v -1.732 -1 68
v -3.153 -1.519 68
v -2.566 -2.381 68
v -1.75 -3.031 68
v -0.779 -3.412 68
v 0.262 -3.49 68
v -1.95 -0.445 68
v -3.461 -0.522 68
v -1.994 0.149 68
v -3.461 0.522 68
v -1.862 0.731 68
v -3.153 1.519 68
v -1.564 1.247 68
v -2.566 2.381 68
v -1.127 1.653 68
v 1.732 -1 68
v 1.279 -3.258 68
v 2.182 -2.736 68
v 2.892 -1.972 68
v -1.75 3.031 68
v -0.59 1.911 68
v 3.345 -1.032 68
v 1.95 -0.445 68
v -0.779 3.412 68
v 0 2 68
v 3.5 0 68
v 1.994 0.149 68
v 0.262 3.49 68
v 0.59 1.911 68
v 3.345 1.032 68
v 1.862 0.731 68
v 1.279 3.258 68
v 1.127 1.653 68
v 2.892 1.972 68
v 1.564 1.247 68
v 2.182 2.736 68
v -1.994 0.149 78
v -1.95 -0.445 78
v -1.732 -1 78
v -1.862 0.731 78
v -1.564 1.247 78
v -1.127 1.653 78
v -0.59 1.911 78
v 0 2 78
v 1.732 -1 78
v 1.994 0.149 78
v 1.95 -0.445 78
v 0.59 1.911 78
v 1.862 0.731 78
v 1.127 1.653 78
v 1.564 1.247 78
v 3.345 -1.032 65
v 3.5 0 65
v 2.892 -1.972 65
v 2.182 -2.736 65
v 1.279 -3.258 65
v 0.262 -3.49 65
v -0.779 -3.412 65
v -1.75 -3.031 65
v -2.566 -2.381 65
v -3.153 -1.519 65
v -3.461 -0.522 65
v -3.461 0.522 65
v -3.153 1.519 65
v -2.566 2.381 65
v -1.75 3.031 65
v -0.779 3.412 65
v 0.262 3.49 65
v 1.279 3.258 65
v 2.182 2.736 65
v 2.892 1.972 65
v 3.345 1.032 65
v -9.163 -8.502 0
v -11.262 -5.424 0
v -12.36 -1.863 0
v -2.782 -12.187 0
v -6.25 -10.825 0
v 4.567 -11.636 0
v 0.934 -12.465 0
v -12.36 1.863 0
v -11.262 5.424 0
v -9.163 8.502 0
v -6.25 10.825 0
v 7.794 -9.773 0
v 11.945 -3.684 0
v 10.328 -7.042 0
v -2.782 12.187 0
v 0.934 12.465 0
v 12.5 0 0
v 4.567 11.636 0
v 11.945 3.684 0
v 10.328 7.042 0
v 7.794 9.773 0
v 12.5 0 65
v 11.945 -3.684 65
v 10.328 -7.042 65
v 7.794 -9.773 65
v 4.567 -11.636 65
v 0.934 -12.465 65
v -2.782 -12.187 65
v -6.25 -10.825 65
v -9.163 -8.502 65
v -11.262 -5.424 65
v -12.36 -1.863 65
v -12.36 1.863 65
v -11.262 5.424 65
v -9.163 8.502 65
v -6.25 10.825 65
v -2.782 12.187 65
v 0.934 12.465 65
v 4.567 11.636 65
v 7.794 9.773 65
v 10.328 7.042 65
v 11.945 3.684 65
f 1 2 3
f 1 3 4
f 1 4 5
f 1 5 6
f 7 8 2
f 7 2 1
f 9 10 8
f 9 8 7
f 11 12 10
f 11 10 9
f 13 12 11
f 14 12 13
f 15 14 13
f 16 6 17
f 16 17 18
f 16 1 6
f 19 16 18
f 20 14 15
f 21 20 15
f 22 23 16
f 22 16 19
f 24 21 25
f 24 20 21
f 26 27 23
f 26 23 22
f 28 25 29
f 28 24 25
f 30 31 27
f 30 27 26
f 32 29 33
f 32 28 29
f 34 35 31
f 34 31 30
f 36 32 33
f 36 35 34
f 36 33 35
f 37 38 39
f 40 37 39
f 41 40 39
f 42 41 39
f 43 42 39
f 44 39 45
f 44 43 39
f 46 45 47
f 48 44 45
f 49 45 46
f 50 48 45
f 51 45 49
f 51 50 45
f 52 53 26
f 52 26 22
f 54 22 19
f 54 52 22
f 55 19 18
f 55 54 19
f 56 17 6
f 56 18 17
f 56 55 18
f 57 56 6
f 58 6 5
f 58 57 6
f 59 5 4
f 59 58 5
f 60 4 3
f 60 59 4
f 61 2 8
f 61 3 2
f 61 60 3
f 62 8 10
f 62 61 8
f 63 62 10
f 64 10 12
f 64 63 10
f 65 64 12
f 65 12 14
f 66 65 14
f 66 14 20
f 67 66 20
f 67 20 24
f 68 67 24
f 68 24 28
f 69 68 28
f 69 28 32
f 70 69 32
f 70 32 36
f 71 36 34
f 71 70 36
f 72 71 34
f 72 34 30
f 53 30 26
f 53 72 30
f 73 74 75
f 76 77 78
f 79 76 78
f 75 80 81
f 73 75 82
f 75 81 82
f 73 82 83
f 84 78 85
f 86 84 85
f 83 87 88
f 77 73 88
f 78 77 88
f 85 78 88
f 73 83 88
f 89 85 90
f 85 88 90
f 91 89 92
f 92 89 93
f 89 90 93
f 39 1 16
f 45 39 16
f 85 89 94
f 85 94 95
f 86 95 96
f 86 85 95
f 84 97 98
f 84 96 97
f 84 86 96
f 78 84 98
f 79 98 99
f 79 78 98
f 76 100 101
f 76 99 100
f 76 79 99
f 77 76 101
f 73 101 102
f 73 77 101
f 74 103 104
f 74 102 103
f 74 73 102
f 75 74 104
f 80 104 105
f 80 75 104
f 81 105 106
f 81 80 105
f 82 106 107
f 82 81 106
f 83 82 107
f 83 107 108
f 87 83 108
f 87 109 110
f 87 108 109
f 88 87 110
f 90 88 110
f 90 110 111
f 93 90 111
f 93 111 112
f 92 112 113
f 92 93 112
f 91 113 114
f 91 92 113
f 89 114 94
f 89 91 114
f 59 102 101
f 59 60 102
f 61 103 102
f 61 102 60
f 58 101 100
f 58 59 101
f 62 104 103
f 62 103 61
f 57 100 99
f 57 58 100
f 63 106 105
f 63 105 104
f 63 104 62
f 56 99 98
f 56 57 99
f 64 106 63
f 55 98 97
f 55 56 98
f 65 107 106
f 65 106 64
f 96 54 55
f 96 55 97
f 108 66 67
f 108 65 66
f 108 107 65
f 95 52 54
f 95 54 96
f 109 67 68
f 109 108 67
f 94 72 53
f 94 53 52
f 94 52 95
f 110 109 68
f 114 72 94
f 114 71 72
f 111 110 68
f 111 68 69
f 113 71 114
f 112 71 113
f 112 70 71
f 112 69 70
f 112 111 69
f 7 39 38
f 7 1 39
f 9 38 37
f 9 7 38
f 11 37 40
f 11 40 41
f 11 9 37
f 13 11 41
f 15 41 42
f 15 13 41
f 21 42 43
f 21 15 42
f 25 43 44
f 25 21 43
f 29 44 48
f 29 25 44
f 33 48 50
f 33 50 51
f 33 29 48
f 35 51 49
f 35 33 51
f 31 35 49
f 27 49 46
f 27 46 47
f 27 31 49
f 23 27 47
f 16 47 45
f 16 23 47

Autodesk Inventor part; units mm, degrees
ref_plane "YZ Plane" through (0, 0, 0) normal (1, 0, 0) x (0, 1, 0)
ref_plane "XZ Plane" through (0, 0, 0) normal (0, 1, 0) x (-1, 0, 0)
ref_plane "XY Plane" through (0, 0, 0) normal (0, 0, 1) x (1, 0, 0)
sketch "Skizze1" plane through (0, 0, 0) normal (0, 0, 1) x (1, 0, 0)
  circle A0 centre (0, 0) radius 12.5
  dimension "d0" = 25
extrude "Extrusion1" add sketch "Skizze1" along normal blind 65
sketch "Skizze2" plane through (0, 0, 65) normal (0, 0, 1) x (1, 0, 0)
  circle A0 centre (0, 0) radius 3.5
  dimension "d3" = 7
extrude "Extrusion2" add sketch "Skizze2" along normal blind 3
sketch "Skizze3" plane through (0, 0, 68) normal (0, 0, 1) x (1, 0, 0)
  arc A0 (1.7321, -1) -> (-1.7321, -1) centre (0, 0) ccw
  line L0 (0, 2) -> (0, -1)
  line L1 (-1.7321, -1) -> (1.7321, -1)
  dimension "d6" = 4
  dimension "d7" = 3
extrude "Extrusion3" add sketch "Skizze3" along normal blind 10
properties part number "Motorskizze"
